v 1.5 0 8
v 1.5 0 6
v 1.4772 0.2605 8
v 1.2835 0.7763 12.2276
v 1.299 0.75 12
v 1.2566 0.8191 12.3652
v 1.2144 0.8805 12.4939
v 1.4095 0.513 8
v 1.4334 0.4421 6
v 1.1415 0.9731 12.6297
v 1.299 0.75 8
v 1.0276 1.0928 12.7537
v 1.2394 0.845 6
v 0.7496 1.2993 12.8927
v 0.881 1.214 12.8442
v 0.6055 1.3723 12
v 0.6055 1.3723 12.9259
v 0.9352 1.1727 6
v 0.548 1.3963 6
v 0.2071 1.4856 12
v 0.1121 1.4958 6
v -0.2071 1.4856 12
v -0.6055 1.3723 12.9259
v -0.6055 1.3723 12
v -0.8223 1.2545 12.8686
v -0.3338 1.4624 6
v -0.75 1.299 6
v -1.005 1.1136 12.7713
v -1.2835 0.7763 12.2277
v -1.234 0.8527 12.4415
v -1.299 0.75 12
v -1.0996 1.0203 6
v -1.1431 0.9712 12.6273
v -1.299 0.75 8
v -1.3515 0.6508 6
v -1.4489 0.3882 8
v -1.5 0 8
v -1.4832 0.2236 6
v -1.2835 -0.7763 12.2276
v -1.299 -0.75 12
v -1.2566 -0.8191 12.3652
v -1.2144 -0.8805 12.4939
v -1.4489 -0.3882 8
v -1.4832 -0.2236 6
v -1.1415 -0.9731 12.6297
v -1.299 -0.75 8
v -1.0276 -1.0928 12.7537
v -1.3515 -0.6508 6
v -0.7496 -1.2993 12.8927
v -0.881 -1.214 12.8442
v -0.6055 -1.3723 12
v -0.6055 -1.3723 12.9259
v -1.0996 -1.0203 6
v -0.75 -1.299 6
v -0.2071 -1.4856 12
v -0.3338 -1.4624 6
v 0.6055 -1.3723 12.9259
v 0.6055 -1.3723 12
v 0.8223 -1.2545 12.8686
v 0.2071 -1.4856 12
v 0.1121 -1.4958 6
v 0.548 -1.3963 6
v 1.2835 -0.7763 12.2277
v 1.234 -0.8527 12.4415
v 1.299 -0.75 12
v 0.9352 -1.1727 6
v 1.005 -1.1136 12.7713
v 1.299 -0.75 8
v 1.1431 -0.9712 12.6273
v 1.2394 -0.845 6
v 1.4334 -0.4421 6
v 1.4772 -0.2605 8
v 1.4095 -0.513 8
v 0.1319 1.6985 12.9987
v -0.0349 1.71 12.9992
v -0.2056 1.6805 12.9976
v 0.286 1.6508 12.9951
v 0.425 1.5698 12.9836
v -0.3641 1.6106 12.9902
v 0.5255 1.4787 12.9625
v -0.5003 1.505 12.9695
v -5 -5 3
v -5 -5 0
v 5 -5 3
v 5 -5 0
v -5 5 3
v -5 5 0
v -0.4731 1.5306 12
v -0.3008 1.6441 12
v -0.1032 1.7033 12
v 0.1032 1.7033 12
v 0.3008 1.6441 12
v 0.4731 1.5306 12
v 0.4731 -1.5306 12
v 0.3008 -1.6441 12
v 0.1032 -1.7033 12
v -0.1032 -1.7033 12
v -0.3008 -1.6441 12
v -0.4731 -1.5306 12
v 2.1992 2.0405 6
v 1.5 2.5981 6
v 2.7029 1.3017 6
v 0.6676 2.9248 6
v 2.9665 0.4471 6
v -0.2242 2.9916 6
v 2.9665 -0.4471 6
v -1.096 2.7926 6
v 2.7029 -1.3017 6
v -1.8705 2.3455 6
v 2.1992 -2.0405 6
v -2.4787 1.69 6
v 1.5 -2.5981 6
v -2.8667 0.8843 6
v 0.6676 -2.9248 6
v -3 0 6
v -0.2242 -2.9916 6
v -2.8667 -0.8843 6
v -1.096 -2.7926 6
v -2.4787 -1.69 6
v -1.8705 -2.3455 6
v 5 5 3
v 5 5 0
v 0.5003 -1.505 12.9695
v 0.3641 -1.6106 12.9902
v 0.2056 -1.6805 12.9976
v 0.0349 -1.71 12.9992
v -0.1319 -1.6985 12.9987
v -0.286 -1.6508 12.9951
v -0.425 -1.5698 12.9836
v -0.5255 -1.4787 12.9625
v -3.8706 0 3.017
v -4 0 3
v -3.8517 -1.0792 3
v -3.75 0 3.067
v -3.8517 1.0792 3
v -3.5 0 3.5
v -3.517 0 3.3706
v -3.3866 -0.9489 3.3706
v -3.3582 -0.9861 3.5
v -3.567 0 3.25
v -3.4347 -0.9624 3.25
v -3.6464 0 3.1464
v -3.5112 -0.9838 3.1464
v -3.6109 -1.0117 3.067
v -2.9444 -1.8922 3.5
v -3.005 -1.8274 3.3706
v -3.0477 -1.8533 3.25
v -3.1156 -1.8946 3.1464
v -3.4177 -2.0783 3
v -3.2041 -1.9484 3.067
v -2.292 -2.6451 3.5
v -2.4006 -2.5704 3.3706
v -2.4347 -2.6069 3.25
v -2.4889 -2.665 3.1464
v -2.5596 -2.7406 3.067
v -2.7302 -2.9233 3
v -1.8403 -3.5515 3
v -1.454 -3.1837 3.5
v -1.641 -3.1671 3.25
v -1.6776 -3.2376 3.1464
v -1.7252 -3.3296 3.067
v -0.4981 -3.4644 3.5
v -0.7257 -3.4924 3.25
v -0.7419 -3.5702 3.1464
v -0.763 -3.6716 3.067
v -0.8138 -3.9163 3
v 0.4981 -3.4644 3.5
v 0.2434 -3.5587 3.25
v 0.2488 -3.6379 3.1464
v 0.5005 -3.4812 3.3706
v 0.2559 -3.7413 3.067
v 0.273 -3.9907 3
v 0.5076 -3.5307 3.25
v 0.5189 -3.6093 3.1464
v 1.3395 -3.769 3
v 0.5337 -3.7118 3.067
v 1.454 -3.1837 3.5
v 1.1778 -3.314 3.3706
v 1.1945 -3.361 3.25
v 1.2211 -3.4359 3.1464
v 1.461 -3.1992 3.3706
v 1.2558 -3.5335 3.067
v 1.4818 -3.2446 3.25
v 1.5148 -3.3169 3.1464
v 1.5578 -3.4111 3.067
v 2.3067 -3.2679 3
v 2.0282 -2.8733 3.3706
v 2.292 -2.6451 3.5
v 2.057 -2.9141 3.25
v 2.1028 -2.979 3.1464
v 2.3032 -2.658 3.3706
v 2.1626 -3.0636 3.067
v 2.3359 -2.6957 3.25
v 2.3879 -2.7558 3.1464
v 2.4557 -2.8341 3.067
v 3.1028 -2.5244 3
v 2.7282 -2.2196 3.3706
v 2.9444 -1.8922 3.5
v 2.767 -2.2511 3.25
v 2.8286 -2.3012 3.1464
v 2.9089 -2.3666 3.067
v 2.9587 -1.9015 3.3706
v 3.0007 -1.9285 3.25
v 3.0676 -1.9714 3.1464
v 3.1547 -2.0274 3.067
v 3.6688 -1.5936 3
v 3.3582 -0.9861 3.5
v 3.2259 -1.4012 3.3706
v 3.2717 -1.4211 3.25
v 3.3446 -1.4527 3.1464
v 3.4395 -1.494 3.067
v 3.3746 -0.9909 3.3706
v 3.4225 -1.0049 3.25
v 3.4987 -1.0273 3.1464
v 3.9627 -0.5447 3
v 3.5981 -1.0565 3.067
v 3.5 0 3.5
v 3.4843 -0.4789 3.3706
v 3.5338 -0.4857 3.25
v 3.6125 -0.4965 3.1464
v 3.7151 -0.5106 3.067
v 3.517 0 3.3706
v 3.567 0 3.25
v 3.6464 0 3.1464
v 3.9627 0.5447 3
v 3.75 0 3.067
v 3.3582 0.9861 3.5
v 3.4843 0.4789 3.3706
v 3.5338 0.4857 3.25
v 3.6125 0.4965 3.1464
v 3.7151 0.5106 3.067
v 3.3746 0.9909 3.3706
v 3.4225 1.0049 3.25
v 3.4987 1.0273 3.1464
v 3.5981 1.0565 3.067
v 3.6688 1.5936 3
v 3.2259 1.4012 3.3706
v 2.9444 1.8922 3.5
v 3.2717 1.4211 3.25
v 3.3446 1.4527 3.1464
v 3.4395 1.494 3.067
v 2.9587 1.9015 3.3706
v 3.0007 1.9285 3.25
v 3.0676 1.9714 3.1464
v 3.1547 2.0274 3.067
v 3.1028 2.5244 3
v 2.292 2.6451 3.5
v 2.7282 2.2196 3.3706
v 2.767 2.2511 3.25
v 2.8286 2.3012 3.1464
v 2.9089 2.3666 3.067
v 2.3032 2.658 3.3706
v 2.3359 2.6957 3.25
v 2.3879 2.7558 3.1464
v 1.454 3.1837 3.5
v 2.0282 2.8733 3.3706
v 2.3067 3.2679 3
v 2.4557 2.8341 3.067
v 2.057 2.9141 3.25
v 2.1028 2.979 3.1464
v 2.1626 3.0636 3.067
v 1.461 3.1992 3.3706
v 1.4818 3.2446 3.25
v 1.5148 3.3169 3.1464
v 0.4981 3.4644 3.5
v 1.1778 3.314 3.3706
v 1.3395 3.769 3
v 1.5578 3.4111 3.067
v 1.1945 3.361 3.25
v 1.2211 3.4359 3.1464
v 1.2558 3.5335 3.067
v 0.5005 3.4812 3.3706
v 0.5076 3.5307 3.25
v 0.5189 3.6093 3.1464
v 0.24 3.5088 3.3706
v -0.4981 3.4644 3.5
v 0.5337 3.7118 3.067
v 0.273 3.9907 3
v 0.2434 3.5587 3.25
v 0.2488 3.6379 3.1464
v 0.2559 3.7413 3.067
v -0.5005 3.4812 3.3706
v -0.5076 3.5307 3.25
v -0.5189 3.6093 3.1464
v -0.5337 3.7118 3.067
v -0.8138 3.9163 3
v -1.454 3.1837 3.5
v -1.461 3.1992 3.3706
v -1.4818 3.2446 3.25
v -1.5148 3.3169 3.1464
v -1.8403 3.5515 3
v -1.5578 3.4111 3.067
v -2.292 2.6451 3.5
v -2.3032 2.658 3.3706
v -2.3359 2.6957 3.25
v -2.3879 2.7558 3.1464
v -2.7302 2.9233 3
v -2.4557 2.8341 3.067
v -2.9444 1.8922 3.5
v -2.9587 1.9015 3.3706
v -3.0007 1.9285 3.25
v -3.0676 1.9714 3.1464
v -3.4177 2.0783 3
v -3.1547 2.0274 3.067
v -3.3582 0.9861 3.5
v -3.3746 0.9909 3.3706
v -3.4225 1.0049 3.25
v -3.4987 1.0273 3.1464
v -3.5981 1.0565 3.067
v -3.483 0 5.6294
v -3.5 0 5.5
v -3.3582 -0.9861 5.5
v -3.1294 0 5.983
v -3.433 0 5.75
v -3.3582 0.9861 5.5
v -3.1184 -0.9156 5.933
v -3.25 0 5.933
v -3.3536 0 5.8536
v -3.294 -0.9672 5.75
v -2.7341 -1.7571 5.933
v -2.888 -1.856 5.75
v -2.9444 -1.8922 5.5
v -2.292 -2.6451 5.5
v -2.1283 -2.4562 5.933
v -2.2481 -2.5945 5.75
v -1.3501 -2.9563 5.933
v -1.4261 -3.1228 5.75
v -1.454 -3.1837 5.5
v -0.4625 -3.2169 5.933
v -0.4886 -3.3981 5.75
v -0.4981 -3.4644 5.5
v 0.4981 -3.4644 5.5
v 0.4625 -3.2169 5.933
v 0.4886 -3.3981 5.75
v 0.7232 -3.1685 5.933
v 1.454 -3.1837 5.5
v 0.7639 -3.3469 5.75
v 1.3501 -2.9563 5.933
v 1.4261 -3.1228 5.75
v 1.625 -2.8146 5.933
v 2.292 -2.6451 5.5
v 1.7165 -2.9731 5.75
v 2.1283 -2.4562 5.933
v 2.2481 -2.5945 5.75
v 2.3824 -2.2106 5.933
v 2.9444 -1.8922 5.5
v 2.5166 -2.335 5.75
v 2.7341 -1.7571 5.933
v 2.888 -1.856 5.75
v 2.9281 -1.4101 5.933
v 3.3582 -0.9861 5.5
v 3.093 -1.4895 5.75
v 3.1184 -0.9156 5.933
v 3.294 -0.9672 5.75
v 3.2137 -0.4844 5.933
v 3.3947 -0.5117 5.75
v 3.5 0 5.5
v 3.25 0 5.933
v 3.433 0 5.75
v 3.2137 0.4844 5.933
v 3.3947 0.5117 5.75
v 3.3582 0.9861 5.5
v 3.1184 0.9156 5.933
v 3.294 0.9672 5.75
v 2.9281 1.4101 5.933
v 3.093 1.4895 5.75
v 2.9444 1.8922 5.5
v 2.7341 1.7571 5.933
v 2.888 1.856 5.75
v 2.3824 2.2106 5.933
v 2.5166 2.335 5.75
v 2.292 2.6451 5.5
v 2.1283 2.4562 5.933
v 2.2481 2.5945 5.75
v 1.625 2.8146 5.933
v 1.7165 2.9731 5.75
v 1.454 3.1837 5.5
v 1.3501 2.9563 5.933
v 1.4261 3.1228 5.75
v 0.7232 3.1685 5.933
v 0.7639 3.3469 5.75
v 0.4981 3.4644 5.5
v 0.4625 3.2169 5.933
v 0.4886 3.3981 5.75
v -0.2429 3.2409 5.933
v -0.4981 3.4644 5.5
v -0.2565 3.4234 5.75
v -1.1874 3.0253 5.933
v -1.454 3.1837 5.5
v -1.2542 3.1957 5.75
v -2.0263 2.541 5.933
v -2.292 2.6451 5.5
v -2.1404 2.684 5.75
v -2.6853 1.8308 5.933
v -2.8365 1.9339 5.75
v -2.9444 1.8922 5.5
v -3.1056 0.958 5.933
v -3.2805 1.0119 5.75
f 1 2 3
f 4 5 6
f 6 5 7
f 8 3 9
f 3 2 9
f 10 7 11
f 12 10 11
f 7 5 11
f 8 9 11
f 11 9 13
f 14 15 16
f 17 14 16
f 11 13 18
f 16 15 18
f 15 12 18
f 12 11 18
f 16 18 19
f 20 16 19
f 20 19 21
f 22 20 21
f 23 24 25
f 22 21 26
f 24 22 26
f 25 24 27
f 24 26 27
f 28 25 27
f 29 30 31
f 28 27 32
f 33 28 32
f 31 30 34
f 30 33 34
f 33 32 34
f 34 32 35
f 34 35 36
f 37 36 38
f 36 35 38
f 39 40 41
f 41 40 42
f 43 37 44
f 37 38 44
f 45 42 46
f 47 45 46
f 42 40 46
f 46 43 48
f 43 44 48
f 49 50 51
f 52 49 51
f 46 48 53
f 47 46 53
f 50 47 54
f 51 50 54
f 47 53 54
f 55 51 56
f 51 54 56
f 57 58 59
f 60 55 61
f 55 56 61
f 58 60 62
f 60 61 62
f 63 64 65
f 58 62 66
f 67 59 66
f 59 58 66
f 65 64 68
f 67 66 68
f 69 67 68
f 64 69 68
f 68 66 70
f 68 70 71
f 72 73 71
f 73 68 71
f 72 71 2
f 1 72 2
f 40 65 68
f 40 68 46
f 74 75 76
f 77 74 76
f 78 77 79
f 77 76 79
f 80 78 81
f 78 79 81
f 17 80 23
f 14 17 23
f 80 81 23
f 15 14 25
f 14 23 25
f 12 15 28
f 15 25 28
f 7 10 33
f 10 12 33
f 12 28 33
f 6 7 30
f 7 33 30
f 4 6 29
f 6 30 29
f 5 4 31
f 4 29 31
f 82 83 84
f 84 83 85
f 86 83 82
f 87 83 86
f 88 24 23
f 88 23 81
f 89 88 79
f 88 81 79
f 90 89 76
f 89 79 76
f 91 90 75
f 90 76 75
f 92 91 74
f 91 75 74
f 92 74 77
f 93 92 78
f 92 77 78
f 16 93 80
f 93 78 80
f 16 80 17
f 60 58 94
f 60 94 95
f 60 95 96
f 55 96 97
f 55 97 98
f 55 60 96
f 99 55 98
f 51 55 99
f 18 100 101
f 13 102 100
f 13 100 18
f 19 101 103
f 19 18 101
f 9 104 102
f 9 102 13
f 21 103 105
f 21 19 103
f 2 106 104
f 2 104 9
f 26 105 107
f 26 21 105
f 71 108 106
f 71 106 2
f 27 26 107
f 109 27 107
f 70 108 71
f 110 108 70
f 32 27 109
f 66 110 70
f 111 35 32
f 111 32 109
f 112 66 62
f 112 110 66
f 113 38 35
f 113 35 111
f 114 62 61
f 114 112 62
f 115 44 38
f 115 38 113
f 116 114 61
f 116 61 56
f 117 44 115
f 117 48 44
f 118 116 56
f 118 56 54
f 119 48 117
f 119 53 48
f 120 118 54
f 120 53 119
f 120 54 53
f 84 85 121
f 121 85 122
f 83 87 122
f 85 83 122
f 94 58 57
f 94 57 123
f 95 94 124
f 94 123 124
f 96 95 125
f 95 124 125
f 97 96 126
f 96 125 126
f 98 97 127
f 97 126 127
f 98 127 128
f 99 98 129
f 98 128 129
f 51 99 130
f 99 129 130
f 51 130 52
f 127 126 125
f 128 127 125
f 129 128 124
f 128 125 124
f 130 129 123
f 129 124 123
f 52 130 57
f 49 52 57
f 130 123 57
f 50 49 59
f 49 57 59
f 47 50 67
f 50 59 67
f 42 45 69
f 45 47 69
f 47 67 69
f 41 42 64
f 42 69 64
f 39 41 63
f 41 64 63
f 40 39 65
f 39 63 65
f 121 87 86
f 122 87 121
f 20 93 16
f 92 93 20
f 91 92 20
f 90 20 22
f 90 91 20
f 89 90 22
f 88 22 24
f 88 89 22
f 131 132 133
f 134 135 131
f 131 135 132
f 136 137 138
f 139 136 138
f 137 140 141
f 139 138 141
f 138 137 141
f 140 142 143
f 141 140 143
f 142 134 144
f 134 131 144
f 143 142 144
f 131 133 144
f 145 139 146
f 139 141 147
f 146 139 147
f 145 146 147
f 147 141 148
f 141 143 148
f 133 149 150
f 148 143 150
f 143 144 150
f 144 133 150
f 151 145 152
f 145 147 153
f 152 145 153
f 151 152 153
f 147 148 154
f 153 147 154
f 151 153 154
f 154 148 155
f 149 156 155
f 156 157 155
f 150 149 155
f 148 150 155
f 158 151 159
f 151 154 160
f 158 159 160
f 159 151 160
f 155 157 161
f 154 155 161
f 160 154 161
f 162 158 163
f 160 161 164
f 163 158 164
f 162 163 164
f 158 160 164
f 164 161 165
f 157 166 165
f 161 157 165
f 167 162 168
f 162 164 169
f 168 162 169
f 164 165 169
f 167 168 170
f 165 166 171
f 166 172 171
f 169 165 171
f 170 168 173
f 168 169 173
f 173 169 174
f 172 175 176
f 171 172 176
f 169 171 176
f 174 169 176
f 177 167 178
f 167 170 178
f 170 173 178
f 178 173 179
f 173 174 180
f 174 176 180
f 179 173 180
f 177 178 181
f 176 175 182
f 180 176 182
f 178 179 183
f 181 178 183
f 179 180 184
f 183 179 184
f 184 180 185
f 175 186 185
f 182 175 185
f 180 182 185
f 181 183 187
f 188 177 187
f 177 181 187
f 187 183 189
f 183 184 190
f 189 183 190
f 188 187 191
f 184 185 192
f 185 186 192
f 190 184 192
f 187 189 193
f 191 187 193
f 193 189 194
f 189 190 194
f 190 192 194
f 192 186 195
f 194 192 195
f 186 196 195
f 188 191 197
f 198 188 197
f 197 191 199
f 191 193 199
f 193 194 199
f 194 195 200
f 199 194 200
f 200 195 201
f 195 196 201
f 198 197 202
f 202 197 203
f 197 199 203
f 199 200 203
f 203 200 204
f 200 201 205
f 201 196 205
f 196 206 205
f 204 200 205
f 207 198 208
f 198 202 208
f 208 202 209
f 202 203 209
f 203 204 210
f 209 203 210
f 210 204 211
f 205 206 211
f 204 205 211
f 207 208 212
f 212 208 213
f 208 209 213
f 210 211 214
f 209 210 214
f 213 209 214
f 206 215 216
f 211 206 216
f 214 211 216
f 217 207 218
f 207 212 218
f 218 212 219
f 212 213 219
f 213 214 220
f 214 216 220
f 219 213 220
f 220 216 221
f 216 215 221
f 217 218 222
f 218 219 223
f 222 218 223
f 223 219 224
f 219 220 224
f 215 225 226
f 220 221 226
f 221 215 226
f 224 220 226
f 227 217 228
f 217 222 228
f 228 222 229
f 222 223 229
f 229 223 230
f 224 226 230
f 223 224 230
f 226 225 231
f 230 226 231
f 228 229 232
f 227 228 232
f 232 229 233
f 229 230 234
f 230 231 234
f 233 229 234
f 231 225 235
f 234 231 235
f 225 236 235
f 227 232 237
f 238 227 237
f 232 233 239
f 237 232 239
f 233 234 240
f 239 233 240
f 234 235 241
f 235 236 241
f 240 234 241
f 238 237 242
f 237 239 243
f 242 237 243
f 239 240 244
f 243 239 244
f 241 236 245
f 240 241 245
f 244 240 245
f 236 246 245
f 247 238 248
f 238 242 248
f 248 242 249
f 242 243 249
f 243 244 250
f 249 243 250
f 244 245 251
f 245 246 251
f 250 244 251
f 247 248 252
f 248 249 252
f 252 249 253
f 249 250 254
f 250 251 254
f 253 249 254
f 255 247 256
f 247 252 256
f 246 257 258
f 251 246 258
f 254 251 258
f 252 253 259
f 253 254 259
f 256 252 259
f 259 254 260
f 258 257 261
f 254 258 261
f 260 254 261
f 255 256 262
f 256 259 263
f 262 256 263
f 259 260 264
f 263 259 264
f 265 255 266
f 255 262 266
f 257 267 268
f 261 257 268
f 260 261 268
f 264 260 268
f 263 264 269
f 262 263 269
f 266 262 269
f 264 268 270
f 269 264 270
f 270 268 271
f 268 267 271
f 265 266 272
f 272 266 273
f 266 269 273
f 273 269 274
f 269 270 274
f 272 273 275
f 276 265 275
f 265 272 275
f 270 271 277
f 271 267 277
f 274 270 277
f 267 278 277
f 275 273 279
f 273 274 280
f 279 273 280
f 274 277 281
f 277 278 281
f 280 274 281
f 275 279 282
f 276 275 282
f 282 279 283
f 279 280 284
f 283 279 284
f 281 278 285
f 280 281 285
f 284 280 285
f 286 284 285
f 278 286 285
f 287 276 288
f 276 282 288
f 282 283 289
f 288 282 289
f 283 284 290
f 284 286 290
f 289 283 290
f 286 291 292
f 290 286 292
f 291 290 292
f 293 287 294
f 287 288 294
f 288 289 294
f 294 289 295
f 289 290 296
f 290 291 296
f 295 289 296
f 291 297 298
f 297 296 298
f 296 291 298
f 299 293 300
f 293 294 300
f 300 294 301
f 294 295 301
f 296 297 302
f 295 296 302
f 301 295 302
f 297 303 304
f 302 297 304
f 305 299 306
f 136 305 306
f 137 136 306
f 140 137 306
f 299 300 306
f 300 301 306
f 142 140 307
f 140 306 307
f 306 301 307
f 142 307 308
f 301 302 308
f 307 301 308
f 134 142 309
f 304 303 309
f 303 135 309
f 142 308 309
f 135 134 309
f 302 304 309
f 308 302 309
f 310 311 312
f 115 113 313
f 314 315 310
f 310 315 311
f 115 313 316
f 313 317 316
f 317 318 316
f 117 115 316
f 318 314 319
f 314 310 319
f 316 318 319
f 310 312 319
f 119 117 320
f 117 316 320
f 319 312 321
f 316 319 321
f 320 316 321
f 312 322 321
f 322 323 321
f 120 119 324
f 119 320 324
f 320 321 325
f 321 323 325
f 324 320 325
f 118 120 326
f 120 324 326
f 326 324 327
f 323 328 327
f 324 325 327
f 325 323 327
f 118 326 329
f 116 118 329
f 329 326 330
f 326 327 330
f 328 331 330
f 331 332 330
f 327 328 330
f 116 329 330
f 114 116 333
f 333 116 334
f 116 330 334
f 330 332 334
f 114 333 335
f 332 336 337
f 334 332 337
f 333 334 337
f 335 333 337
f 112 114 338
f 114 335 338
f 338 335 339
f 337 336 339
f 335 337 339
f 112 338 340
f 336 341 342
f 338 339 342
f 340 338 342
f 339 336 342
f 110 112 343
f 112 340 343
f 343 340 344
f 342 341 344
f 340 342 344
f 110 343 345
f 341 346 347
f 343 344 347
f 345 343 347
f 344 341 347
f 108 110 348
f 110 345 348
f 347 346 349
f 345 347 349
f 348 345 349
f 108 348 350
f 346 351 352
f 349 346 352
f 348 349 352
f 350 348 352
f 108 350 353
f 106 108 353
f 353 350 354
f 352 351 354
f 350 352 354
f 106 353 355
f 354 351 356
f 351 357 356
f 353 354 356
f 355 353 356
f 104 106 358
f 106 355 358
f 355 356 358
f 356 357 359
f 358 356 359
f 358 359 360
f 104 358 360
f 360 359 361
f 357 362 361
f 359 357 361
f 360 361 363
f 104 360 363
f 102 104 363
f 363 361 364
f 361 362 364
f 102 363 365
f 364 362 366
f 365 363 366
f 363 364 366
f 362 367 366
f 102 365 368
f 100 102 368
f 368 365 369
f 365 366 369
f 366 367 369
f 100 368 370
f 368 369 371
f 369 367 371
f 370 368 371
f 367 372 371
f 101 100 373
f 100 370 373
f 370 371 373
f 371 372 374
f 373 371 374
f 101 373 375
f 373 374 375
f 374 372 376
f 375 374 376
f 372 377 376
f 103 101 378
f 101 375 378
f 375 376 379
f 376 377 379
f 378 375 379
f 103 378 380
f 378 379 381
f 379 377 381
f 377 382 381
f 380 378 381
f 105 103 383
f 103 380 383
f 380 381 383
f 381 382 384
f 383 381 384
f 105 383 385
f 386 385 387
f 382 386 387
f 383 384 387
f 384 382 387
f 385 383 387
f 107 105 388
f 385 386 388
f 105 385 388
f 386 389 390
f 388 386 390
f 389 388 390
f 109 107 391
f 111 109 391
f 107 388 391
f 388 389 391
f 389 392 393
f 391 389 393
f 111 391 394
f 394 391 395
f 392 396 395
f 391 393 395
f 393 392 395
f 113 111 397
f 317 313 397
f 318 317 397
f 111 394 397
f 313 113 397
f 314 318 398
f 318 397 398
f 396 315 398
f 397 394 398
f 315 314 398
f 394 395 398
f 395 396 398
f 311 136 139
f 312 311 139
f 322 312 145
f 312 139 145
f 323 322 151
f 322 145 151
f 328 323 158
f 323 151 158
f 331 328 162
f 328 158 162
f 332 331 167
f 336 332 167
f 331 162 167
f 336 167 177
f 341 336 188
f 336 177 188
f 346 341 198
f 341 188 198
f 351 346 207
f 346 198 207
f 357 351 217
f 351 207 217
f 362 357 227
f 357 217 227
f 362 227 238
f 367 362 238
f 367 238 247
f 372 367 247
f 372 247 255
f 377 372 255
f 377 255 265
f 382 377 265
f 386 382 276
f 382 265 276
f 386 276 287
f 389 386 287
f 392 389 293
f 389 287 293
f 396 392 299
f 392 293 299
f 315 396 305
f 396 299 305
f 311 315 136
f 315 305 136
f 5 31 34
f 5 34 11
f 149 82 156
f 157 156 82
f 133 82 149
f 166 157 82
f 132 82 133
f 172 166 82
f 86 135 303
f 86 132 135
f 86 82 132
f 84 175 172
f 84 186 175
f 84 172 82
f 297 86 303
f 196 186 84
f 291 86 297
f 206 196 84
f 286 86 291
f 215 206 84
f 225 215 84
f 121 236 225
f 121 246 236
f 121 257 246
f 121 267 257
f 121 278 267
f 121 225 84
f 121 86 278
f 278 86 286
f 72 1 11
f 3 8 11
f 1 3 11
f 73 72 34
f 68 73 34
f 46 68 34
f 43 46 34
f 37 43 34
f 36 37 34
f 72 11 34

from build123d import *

# Parameters (mm, degrees)
ESQUISSE1_W             = 10
ESQUISSE1_H             = 10
BOSS_EXTRU_1_DEPTH      = 3
ESQUISSE2_R             = 3.5
BOSS_EXTRU_2_DEPTH      = 3
ESQUISSE5_R             = 1.5
BOSS_EXTRU_4_DEPTH      = 7
BOSS_EXTRU_5_DEPTH      = 1
ENL_V_MAT_EXTRU_1_DEPTH = 5
CONG_1_R                = 1
CONG_5_R                = 0.5


with BuildPart() as part:
    # Esquisse1 → Boss.-Extru.1 (new body)
    with BuildSketch(Plane.XY):
        Rectangle(ESQUISSE1_W, ESQUISSE1_H)
    extrude(amount=BOSS_EXTRU_1_DEPTH)

    # Esquisse2 → Boss.-Extru.2 (add)
    with BuildSketch(Plane.XY.offset(3)):
        with Locations(Location((0, 0, 0), (0, 0, 180))):
            Circle(ESQUISSE2_R)
    extrude(amount=BOSS_EXTRU_2_DEPTH)

    # Esquisse5 → Boss.-Extru.4 (add)
    with BuildSketch(Plane.XY.offset(6)):
        Circle(ESQUISSE5_R)
    extrude(amount=BOSS_EXTRU_4_DEPTH)

    # Esquisse6 → Boss.-Extru.5 (add)
    with BuildSketch(Plane.XY.offset(13)):
        with BuildLine():
            Line((-0.710860958, -1), (-0.710860958, 1))
            ThreePointArc((-0.710860958, 1), (0, 1.710860958), (0.710860958, 1))
            Line((0.710860958, 1), (0.710860958, -1))
            ThreePointArc((0.710860958, -1), (0, -1.710860958), (-0.710860958, -1))
        make_face()
    extrude(amount=-BOSS_EXTRU_5_DEPTH)

    # Esquisse7 → Enlèv. mat.-Extru.1 (cut)
    with BuildSketch(Plane.XY.offset(13)):
        with BuildLine():
            Line((1.624079267, -0.75), (-1.624079267, -0.75))
            ThreePointArc((-1.624079267, -0.75), (-2.374079267, 0), (-1.624079267, 0.75))
            Line((-1.624079267, 0.75), (1.624079267, 0.75))
            ThreePointArc((1.624079267, 0.75), (2.374079267, 0), (1.624079267, -0.75))
        make_face()
    extrude(amount=-ENL_V_MAT_EXTRU_1_DEPTH, mode=Mode.SUBTRACT)

    # Congé1
    # the kernel refuses this fillet: 1 mm, written as the material it takes off along each edge
    with BuildSketch(Plane(origin=(-3.799038106, 0.75, 13), x_dir=(0, 0, -1), z_dir=(1, 0, 0)), Plane(origin=(3.799038106, -0.75, 13), x_dir=(0, 0, -1), z_dir=(-1, 0, 0))) as cong_1_piece_1:
        with BuildLine():
            CenterArc((CONG_1_R, CONG_1_R), CONG_1_R, 180, 90)
            Line((0, CONG_1_R), (0, 0))
            Line((0, 0), (CONG_1_R, 0))
        make_face()
    extrude(amount=7.598076211, mode=Mode.SUBTRACT)

    # Congé5
    cong_5_edges = [part.edges().sort_by_distance(p)[0] for p in [
        (3.5, 0, 3),
        (3.5, 0, 6),
    ]]
    fillet(cong_5_edges, radius=CONG_5_R)


solid = part.part
